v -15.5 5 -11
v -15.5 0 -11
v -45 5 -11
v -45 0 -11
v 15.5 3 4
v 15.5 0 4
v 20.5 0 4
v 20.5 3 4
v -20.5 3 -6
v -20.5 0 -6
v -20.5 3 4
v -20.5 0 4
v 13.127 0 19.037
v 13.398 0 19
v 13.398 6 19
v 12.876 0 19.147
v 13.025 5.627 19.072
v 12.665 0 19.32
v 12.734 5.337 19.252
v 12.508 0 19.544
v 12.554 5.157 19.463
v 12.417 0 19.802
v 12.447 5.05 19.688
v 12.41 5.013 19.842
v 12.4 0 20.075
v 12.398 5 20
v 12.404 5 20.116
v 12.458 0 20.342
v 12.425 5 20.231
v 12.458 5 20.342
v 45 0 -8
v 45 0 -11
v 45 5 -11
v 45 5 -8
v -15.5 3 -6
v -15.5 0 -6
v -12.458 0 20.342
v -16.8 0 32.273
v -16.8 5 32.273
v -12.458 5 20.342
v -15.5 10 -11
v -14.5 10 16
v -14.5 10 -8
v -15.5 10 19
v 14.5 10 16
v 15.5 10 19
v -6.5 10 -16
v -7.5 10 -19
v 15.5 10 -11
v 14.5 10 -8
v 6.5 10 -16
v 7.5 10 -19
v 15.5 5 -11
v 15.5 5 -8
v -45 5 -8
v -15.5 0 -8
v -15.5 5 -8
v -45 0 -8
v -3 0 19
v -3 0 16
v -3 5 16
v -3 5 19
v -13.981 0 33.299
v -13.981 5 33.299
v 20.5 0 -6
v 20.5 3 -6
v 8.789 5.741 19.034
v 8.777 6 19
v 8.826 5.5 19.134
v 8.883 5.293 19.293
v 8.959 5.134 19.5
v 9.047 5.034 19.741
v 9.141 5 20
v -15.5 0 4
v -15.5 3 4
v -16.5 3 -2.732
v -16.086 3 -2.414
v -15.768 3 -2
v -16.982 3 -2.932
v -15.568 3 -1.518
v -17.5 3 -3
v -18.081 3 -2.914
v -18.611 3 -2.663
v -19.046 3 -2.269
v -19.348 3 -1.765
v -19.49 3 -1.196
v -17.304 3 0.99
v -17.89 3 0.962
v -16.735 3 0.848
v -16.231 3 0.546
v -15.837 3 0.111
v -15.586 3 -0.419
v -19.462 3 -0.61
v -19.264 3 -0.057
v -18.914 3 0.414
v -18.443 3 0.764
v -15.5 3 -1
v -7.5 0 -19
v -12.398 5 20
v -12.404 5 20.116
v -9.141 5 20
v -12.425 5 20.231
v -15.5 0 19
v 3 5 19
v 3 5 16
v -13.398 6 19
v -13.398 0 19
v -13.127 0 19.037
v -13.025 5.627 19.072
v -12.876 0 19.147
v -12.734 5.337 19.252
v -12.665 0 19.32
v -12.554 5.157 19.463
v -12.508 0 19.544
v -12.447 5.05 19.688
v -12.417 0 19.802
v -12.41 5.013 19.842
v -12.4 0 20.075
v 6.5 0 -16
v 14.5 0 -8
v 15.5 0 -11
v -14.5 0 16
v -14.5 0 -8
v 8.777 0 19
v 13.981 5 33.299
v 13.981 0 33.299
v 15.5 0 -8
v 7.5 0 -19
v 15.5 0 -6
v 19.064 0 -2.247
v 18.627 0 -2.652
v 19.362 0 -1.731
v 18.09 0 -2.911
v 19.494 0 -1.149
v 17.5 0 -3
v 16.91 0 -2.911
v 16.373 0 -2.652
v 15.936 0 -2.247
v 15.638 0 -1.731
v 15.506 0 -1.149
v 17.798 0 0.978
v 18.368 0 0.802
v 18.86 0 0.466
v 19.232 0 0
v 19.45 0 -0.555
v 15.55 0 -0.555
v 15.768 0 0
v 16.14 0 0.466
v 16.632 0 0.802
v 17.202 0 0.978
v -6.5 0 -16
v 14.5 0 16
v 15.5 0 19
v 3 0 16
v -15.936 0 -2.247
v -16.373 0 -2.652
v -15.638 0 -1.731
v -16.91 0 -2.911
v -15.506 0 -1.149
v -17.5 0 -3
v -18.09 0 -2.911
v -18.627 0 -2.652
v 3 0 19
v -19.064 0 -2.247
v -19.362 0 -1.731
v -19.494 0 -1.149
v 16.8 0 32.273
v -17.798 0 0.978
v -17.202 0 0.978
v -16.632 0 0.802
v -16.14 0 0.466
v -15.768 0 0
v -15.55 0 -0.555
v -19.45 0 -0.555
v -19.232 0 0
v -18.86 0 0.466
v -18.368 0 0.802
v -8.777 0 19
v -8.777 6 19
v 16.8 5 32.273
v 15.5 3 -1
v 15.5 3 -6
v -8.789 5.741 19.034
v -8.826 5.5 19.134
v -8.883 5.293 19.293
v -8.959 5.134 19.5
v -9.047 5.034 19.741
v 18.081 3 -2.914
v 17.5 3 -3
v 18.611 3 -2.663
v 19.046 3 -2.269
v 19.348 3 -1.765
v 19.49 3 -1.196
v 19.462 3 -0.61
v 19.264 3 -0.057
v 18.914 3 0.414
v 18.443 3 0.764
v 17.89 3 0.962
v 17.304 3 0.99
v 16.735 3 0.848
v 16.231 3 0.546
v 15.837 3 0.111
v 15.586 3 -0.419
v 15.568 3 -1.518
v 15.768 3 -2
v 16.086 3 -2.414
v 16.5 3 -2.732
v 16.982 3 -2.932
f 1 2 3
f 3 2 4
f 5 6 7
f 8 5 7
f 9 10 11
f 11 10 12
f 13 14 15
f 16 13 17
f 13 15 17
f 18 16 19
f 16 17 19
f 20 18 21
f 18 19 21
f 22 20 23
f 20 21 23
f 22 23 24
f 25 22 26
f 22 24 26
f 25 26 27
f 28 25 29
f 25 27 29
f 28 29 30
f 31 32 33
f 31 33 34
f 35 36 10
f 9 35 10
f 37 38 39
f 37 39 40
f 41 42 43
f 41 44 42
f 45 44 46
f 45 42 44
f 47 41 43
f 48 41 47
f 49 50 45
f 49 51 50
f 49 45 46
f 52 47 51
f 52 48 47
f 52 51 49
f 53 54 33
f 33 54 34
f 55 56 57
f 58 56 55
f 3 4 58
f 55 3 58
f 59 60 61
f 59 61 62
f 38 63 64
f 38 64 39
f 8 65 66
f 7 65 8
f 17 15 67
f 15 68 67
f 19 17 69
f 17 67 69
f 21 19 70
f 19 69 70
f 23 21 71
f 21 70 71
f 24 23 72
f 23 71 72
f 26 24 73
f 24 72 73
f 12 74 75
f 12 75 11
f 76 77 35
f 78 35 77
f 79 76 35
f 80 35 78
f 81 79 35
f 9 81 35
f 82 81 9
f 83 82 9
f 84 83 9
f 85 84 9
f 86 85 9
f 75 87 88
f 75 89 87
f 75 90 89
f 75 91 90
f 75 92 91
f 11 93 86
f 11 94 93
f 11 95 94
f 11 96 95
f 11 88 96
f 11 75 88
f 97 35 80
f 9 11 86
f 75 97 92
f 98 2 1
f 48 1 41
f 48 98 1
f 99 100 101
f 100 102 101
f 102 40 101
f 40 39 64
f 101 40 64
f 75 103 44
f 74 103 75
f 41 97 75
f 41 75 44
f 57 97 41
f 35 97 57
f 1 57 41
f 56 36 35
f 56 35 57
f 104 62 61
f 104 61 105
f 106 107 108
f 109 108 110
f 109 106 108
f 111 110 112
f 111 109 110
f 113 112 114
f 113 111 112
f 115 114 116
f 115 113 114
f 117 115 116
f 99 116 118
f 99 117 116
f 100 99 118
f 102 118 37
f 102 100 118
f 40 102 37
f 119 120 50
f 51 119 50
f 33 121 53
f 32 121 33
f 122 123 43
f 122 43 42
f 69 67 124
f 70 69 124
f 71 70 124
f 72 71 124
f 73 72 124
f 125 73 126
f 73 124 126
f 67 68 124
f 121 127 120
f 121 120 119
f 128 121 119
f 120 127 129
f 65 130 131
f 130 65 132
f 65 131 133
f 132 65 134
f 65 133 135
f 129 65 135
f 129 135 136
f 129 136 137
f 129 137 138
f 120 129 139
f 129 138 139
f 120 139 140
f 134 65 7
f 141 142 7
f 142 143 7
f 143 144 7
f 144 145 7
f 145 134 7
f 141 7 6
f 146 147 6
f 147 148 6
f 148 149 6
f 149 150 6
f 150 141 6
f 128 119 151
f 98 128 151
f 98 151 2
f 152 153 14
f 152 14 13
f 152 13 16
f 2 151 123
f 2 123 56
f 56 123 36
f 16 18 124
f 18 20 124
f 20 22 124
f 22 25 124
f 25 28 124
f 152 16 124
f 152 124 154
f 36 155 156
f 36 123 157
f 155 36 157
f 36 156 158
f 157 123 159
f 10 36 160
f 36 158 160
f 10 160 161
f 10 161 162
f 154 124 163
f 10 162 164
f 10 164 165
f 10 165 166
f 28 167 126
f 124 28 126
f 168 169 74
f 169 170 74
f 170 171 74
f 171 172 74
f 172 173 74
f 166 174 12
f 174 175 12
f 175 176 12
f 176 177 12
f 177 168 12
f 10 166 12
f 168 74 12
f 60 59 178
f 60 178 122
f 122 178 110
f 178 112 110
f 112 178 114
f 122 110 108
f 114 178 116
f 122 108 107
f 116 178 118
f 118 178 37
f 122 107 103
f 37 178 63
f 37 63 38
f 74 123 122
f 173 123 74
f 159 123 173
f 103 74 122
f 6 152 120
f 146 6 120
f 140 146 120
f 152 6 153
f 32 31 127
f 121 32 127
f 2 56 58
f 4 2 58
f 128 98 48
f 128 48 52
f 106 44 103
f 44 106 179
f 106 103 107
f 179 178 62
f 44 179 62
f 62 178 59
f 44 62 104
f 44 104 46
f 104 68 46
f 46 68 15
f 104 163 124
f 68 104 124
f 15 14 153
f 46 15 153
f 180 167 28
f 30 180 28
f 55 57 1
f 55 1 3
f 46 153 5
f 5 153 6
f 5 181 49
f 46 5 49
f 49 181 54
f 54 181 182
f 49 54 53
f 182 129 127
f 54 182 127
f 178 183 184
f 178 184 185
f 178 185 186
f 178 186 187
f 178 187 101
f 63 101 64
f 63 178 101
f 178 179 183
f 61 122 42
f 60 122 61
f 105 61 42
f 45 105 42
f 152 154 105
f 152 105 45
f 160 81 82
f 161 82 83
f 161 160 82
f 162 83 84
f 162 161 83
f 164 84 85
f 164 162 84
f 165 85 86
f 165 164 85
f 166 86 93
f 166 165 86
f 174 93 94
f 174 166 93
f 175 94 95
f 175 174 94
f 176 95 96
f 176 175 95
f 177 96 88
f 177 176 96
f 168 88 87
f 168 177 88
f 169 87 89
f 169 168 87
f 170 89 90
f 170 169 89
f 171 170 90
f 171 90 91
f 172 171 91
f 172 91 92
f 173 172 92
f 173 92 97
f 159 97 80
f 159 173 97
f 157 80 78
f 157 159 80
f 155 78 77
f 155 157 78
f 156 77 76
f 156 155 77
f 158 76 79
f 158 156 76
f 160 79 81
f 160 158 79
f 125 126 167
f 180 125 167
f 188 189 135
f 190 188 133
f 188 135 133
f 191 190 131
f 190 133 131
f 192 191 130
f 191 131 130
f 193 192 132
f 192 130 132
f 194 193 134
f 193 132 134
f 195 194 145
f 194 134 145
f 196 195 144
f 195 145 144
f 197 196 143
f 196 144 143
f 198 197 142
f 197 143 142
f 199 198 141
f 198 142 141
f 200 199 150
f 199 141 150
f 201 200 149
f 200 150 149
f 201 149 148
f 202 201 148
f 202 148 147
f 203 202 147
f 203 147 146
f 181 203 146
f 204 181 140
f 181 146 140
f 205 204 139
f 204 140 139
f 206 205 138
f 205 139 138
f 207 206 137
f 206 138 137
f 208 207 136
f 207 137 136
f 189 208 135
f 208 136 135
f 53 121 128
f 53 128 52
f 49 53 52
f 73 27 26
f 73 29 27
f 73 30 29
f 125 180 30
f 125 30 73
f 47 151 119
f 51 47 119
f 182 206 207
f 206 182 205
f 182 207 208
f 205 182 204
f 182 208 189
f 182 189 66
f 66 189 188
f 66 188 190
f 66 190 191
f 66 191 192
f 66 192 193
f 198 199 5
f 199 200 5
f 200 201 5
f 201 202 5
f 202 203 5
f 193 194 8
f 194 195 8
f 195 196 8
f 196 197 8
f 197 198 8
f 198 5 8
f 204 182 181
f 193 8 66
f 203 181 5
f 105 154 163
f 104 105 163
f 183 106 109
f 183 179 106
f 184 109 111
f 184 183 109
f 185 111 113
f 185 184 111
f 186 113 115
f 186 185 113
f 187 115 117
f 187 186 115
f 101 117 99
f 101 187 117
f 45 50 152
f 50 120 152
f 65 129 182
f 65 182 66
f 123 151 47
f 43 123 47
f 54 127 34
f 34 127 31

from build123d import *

# Parameters (mm, degrees)
SKETCH1_W            = 31
SKETCH1_H            = 38
SKETCH1_W_2          = 29
SKETCH1_H_2          = 32
BOSS_EXTRUDE1_DEPTH  = 10
SKETCH2_W            = 6
SKETCH2_H            = 10
SKETCH2_R            = 2
BOSS_EXTRUDE2_DEPTH  = 3
SKETCH3_W            = 6
SKETCH3_H            = 3
CUT_EXTRUDE1_DEPTH   = 5
SKETCH4_W            = 29.5
SKETCH4_H            = 3
BOSS_EXTRUDE3_DEPTH  = 5
FILLET1_R            = 1
CHAMFER1_SIZE        = 8
FILLET1_OF_MIRROR2_R = 1


with BuildPart() as part:
    # Sketch1 → Boss-Extrude1 (new body)
    with BuildSketch(Plane(origin=(0, 0, 0), x_dir=(1, 0, 0), z_dir=(0, 1, 0))):
        Rectangle(SKETCH1_W, SKETCH1_H)
        Rectangle(SKETCH1_W_2, SKETCH1_H_2, mode=Mode.SUBTRACT)
    extrude(amount=BOSS_EXTRUDE1_DEPTH)

    # Sketch2 → Boss-Extrude2 (add)
    with BuildSketch(Plane.XZ):
        with Locations((17.5, -1)):
            Rectangle(SKETCH2_W, SKETCH2_H)
        with Locations(Location((17.5, -1, 0), (0, 0, 270))):
            Circle(SKETCH2_R, mode=Mode.SUBTRACT)
    boss_extrude2 = extrude(amount=-BOSS_EXTRUDE2_DEPTH)

    # Mirror1: Boss-Extrude2 across plane
    add(boss_extrude2.mirror(Plane(origin=(0, 0, 0), x_dir=(0, 0, 1), z_dir=(1, 0, 0))))

    # Sketch3 → Cut-Extrude1 (cut)
    with BuildSketch(Plane.XZ):
        with Locations((0, 17.5)):
            Rectangle(SKETCH3_W, SKETCH3_H)
    extrude(amount=-CUT_EXTRUDE1_DEPTH, mode=Mode.SUBTRACT)

    # Sketch4 → Boss-Extrude3 (add)
    with BuildSketch(Plane.XZ):
        Polygon((13.981367518, 33.29919815), (16.800445381, 32.27313772), (11.969418335, 19), (8.776885018, 19), align=None)
        with Locations((30.25, -9.5)):
            Rectangle(SKETCH4_W, SKETCH4_H)
    boss_extrude3 = extrude(amount=-BOSS_EXTRUDE3_DEPTH)

    # Fillet1
    fillet1_edges = [part.edges().sort_by_distance(p)[0] for p in [
        (10.373151677, 5, 19),
        (11.969418335, 2.5, 19),
    ]]
    fillet(fillet1_edges, radius=FILLET1_R)

    # Chamfer1
    chamfer1_edges = [part.edges().sort_by_distance(p)[0] for p in [
        (15.5, 5, -19),
        (-15.5, 5, -19),
        (14.5, 5, -16),
        (-14.5, 5, -16),
    ]]
    chamfer(chamfer1_edges, length=CHAMFER1_SIZE)

    # Mirror2: Boss-Extrude3 across plane
    add(boss_extrude3.mirror(Plane(origin=(0, 0, 0), x_dir=(0, 0, 1), z_dir=(1, 0, 0))))

    # Fillet1 of Mirror2
    fillet1_of_mirror2_edges = [part.edges().sort_by_distance(p)[0] for p in [
        (-10.373151677, 5, 19),
        (-11.969418335, 2.5, 19),
    ]]
    fillet(fillet1_of_mirror2_edges, radius=FILLET1_OF_MIRROR2_R)


solid = part.part
